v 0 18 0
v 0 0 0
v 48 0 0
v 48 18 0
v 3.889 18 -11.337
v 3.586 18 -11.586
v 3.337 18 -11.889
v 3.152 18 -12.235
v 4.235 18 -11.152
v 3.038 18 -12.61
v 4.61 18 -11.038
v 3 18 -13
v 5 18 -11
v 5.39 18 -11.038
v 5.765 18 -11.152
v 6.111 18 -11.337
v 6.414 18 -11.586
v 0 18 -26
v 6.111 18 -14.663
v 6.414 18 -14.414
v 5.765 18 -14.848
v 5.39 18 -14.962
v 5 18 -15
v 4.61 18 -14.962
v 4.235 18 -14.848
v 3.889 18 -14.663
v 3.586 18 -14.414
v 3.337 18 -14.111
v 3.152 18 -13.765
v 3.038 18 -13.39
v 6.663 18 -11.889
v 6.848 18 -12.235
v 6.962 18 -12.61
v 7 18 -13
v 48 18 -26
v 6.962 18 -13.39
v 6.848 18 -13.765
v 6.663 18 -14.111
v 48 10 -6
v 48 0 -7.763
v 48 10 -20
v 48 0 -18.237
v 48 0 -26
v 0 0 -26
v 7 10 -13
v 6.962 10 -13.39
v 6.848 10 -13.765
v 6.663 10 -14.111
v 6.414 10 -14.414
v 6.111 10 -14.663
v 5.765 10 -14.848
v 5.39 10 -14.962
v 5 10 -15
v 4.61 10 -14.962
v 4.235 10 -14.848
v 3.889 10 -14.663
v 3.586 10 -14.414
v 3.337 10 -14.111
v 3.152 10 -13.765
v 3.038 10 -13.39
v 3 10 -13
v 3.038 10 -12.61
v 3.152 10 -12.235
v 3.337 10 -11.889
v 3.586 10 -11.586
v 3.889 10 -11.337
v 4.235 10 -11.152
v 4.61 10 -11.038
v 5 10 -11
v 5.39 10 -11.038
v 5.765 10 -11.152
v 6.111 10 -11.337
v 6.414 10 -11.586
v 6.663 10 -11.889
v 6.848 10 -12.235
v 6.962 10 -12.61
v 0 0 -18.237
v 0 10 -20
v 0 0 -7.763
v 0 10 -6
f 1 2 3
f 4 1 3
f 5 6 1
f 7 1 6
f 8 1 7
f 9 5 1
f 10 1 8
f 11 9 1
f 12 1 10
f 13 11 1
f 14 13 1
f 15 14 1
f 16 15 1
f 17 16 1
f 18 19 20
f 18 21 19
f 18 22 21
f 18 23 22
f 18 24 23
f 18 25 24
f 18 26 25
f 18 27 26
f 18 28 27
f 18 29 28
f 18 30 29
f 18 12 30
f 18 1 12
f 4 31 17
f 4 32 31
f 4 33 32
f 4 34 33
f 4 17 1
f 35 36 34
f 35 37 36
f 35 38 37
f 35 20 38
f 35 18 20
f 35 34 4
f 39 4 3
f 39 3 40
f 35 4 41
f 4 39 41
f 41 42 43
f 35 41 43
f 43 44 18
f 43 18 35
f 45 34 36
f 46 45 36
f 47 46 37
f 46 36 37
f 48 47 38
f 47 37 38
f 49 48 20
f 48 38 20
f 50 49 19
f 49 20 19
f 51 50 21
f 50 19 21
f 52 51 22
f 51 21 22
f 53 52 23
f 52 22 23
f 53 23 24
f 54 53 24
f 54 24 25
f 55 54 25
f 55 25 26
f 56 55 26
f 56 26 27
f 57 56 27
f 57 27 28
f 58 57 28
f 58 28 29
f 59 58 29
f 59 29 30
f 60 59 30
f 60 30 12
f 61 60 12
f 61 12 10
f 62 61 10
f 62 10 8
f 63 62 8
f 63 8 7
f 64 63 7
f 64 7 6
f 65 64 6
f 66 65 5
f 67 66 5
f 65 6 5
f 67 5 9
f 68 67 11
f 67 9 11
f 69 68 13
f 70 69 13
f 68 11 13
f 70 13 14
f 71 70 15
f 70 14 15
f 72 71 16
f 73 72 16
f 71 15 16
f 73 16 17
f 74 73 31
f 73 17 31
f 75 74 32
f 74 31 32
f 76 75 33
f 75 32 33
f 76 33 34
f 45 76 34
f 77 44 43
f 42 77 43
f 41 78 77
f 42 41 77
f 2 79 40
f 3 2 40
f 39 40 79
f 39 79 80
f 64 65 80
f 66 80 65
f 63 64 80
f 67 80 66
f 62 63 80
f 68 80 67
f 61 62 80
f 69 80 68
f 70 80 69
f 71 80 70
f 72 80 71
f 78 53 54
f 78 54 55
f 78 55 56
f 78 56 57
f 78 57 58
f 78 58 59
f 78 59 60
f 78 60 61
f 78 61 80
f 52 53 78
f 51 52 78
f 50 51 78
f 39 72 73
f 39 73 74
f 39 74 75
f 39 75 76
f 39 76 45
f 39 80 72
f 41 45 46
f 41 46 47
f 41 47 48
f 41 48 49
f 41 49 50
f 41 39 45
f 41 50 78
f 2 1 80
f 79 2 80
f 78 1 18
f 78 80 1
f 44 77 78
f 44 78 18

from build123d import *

# Parameters (mm, degrees)
SKETCH1_W               = 48
SKETCH1_H               = 26
BOSS_EXTRUDE1_DEPTH     = 18
CUT_EXTRUDE1_DEPTH      = 1
CUT_EXTRUDE1_DEPTH_BACK = 49
SKETCH3_R               = 2
CUT_EXTRUDE2_DEPTH      = 1
CUT_EXTRUDE2_DEPTH_BACK = 19


with BuildPart() as part:
    # Sketch1 → Boss-Extrude1 (new body)
    with BuildSketch(Plane(origin=(0, 0, 0), x_dir=(1, 0, 0), z_dir=(0, 1, 0))):
        with Locations((24, 13)):
            Rectangle(SKETCH1_W, SKETCH1_H)
    extrude(amount=BOSS_EXTRUDE1_DEPTH)

    # Sketch2 → Cut-Extrude1 (cut, two sides)
    with BuildSketch(Plane(origin=(48, 0, 0), x_dir=(0, 0, -1), z_dir=(1, 0, 0))) as cut_extrude1_sk:
        Polygon((6, 10), (20, 10), (18.236730193, 0), (7.763269807, 0), align=None)
    extrude(amount=CUT_EXTRUDE1_DEPTH, mode=Mode.SUBTRACT)
    extrude(cut_extrude1_sk.sketch, amount=-CUT_EXTRUDE1_DEPTH_BACK, mode=Mode.SUBTRACT)

    # Sketch3 → Cut-Extrude2 (cut, two sides)
    with BuildSketch(Plane(origin=(0, 18, 0), x_dir=(1, 0, 0), z_dir=(0, 1, 0))) as cut_extrude2_sk:
        with Locations((5, 13)):
            Circle(SKETCH3_R)
    extrude(amount=CUT_EXTRUDE2_DEPTH, mode=Mode.SUBTRACT)
    extrude(cut_extrude2_sk.sketch, amount=-CUT_EXTRUDE2_DEPTH_BACK, mode=Mode.SUBTRACT)


solid = part.part
